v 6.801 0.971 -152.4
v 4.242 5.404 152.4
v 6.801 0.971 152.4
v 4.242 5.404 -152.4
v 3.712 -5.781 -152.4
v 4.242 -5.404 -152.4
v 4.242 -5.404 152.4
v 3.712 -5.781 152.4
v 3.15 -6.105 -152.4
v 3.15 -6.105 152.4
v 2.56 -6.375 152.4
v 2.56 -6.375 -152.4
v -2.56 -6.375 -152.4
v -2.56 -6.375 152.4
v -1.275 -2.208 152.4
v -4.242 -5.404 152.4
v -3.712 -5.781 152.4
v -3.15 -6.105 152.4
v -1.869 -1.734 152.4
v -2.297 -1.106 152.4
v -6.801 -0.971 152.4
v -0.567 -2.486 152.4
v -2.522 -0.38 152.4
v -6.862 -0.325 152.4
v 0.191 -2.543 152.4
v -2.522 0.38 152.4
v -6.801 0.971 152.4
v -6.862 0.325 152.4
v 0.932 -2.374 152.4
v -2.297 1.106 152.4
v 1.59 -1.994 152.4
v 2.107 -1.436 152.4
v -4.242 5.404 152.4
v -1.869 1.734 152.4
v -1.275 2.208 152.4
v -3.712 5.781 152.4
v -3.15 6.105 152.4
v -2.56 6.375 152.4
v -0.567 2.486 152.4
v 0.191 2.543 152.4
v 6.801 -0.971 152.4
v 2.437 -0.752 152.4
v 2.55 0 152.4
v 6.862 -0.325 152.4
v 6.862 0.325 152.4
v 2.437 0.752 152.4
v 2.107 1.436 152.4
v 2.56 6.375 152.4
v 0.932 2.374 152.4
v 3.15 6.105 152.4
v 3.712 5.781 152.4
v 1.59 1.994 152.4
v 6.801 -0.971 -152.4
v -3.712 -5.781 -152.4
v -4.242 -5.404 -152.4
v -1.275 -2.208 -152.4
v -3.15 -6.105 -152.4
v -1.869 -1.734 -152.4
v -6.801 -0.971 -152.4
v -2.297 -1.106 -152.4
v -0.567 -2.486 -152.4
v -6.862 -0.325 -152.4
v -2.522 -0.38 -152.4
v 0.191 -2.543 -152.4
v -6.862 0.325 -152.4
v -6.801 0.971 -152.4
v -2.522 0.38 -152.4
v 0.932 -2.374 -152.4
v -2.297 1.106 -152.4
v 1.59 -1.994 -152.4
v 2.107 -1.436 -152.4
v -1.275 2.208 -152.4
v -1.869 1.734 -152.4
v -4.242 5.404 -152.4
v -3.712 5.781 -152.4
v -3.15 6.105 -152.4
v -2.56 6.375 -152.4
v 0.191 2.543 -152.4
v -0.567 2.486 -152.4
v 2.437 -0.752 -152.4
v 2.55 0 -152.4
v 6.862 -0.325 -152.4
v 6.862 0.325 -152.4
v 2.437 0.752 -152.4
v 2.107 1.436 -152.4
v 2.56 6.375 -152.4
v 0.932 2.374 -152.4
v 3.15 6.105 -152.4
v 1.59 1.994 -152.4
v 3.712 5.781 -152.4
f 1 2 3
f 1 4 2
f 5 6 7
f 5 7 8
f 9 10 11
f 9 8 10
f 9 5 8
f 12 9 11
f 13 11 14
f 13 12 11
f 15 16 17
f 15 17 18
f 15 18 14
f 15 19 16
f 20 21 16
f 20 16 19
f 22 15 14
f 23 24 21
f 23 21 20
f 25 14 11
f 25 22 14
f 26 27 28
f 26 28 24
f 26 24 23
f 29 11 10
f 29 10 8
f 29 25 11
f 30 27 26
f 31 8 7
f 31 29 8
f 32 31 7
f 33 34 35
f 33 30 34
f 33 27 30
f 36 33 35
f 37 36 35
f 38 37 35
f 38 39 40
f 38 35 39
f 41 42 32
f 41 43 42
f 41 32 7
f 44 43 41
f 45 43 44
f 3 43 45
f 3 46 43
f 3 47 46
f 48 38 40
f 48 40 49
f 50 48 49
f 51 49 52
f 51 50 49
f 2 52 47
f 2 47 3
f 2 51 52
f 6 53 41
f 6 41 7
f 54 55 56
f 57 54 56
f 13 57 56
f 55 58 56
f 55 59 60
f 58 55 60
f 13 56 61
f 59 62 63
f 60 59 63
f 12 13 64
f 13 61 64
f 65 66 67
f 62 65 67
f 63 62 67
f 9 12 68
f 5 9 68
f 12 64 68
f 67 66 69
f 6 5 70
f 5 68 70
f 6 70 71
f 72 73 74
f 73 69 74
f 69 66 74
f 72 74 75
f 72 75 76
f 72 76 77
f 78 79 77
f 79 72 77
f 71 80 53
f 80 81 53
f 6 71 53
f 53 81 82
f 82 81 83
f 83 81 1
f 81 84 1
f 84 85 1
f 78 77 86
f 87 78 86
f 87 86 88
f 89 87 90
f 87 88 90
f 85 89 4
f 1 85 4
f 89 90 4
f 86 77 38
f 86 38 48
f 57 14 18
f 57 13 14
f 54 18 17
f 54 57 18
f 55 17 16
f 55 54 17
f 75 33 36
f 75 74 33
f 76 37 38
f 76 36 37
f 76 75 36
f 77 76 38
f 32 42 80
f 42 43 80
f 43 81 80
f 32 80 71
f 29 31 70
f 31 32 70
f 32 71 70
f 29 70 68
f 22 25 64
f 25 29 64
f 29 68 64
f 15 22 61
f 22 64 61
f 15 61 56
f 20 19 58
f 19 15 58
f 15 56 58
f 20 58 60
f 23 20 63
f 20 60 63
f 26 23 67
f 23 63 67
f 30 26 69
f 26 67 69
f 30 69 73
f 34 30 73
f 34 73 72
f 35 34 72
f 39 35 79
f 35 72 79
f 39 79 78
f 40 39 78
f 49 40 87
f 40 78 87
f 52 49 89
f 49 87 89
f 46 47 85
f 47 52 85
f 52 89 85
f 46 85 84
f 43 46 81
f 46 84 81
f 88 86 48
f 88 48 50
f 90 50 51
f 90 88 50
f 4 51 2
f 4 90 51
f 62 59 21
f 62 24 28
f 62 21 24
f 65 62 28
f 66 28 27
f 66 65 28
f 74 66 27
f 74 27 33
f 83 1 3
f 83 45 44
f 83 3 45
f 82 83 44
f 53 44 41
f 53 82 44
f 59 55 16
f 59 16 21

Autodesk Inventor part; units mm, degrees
ref_plane "YZ Plane" through (0, 0, 0) normal (1, 0, 0) x (0, 1, 0)
ref_plane "XZ Plane" through (0, 0, 0) normal (0, 1, 0) x (-1, 0, 0)
ref_plane "XY Plane" through (0, 0, 0) normal (0, 0, 1) x (1, 0, 0)
sketch "ThunderHex" plane through (0, 0, 0) normal (0, 0, 1) x (1, 0, 0)
  line L0 (0, 0) -> (5.1191, 0)
  line L1 (6.801, -0.9711) -> (9.3605, -5.4043)
  arc A0 (0, 0) -> (-1.682, -0.9711) centre (2.5595, -6.3754) ccw
  arc A1 (9.3605, -7.3465) -> (9.3605, -5.4043) centre (2.5595, -6.3754) ccw
  circle A2 centre (2.5595, -6.3754) radius 2.55
  line L2 (-4.2415, -5.4043) -> (-1.682, -0.9711)
  arc A3 (-4.2415, -5.4043) -> (-4.2415, -7.3465) centre (2.5595, -6.3754) ccw
  line L3 (-1.682, -11.7797) -> (-4.2415, -7.3465)
  arc A4 (-1.682, -11.7797) -> (0, -12.7508) centre (2.5595, -6.3754) ccw
  line L4 (5.1191, -12.7508) -> (0, -12.7508)
  arc A5 (5.1191, -12.7508) -> (6.801, -11.7797) centre (2.5595, -6.3754) ccw
  line L5 (9.3605, -7.3465) -> (6.801, -11.7797)
  arc A6 (6.801, -0.9711) -> (5.1191, 0) centre (2.5595, -6.3754) ccw
  point P0 (2.5595, -6.3754)
sketch "Sketch1" plane through (0, 0, 0) normal (0, 0, 1) x (1, 0, 0)
  line L0 (-2.5595, 6.3754) -> (2.5595, 6.3754)
  line L1 (4.2415, 5.4043) -> (6.801, 0.9711)
  arc A0 (-2.5595, 6.3754) -> (-4.2415, 5.4043) centre (0, 0) ccw
  arc A1 (6.801, -0.9711) -> (6.801, 0.9711) centre (0, 0) ccw
  circle A2 centre (0, 0) radius 2.55
  line L2 (-6.801, 0.9711) -> (-4.2415, 5.4043)
  arc A3 (-6.801, 0.9711) -> (-6.801, -0.9711) centre (0, 0) ccw
  line L3 (-4.2415, -5.4043) -> (-6.801, -0.9711)
  arc A4 (-4.2415, -5.4043) -> (-2.5595, -6.3754) centre (0, 0) ccw
  line L4 (2.5595, -6.3754) -> (-2.5595, -6.3754)
  arc A5 (2.5595, -6.3754) -> (4.2415, -5.4043) centre (0, 0) ccw
  line L5 (6.801, -0.9711) -> (4.2415, -5.4043)
  arc A6 (4.2415, 5.4043) -> (2.5595, 6.3754) centre (0, 0) ccw
extrude "Extrusion1" add sketch "Sketch1" along normal mid plane 304.8
properties part number "ThunderHex" material "Aluminum 6061"
